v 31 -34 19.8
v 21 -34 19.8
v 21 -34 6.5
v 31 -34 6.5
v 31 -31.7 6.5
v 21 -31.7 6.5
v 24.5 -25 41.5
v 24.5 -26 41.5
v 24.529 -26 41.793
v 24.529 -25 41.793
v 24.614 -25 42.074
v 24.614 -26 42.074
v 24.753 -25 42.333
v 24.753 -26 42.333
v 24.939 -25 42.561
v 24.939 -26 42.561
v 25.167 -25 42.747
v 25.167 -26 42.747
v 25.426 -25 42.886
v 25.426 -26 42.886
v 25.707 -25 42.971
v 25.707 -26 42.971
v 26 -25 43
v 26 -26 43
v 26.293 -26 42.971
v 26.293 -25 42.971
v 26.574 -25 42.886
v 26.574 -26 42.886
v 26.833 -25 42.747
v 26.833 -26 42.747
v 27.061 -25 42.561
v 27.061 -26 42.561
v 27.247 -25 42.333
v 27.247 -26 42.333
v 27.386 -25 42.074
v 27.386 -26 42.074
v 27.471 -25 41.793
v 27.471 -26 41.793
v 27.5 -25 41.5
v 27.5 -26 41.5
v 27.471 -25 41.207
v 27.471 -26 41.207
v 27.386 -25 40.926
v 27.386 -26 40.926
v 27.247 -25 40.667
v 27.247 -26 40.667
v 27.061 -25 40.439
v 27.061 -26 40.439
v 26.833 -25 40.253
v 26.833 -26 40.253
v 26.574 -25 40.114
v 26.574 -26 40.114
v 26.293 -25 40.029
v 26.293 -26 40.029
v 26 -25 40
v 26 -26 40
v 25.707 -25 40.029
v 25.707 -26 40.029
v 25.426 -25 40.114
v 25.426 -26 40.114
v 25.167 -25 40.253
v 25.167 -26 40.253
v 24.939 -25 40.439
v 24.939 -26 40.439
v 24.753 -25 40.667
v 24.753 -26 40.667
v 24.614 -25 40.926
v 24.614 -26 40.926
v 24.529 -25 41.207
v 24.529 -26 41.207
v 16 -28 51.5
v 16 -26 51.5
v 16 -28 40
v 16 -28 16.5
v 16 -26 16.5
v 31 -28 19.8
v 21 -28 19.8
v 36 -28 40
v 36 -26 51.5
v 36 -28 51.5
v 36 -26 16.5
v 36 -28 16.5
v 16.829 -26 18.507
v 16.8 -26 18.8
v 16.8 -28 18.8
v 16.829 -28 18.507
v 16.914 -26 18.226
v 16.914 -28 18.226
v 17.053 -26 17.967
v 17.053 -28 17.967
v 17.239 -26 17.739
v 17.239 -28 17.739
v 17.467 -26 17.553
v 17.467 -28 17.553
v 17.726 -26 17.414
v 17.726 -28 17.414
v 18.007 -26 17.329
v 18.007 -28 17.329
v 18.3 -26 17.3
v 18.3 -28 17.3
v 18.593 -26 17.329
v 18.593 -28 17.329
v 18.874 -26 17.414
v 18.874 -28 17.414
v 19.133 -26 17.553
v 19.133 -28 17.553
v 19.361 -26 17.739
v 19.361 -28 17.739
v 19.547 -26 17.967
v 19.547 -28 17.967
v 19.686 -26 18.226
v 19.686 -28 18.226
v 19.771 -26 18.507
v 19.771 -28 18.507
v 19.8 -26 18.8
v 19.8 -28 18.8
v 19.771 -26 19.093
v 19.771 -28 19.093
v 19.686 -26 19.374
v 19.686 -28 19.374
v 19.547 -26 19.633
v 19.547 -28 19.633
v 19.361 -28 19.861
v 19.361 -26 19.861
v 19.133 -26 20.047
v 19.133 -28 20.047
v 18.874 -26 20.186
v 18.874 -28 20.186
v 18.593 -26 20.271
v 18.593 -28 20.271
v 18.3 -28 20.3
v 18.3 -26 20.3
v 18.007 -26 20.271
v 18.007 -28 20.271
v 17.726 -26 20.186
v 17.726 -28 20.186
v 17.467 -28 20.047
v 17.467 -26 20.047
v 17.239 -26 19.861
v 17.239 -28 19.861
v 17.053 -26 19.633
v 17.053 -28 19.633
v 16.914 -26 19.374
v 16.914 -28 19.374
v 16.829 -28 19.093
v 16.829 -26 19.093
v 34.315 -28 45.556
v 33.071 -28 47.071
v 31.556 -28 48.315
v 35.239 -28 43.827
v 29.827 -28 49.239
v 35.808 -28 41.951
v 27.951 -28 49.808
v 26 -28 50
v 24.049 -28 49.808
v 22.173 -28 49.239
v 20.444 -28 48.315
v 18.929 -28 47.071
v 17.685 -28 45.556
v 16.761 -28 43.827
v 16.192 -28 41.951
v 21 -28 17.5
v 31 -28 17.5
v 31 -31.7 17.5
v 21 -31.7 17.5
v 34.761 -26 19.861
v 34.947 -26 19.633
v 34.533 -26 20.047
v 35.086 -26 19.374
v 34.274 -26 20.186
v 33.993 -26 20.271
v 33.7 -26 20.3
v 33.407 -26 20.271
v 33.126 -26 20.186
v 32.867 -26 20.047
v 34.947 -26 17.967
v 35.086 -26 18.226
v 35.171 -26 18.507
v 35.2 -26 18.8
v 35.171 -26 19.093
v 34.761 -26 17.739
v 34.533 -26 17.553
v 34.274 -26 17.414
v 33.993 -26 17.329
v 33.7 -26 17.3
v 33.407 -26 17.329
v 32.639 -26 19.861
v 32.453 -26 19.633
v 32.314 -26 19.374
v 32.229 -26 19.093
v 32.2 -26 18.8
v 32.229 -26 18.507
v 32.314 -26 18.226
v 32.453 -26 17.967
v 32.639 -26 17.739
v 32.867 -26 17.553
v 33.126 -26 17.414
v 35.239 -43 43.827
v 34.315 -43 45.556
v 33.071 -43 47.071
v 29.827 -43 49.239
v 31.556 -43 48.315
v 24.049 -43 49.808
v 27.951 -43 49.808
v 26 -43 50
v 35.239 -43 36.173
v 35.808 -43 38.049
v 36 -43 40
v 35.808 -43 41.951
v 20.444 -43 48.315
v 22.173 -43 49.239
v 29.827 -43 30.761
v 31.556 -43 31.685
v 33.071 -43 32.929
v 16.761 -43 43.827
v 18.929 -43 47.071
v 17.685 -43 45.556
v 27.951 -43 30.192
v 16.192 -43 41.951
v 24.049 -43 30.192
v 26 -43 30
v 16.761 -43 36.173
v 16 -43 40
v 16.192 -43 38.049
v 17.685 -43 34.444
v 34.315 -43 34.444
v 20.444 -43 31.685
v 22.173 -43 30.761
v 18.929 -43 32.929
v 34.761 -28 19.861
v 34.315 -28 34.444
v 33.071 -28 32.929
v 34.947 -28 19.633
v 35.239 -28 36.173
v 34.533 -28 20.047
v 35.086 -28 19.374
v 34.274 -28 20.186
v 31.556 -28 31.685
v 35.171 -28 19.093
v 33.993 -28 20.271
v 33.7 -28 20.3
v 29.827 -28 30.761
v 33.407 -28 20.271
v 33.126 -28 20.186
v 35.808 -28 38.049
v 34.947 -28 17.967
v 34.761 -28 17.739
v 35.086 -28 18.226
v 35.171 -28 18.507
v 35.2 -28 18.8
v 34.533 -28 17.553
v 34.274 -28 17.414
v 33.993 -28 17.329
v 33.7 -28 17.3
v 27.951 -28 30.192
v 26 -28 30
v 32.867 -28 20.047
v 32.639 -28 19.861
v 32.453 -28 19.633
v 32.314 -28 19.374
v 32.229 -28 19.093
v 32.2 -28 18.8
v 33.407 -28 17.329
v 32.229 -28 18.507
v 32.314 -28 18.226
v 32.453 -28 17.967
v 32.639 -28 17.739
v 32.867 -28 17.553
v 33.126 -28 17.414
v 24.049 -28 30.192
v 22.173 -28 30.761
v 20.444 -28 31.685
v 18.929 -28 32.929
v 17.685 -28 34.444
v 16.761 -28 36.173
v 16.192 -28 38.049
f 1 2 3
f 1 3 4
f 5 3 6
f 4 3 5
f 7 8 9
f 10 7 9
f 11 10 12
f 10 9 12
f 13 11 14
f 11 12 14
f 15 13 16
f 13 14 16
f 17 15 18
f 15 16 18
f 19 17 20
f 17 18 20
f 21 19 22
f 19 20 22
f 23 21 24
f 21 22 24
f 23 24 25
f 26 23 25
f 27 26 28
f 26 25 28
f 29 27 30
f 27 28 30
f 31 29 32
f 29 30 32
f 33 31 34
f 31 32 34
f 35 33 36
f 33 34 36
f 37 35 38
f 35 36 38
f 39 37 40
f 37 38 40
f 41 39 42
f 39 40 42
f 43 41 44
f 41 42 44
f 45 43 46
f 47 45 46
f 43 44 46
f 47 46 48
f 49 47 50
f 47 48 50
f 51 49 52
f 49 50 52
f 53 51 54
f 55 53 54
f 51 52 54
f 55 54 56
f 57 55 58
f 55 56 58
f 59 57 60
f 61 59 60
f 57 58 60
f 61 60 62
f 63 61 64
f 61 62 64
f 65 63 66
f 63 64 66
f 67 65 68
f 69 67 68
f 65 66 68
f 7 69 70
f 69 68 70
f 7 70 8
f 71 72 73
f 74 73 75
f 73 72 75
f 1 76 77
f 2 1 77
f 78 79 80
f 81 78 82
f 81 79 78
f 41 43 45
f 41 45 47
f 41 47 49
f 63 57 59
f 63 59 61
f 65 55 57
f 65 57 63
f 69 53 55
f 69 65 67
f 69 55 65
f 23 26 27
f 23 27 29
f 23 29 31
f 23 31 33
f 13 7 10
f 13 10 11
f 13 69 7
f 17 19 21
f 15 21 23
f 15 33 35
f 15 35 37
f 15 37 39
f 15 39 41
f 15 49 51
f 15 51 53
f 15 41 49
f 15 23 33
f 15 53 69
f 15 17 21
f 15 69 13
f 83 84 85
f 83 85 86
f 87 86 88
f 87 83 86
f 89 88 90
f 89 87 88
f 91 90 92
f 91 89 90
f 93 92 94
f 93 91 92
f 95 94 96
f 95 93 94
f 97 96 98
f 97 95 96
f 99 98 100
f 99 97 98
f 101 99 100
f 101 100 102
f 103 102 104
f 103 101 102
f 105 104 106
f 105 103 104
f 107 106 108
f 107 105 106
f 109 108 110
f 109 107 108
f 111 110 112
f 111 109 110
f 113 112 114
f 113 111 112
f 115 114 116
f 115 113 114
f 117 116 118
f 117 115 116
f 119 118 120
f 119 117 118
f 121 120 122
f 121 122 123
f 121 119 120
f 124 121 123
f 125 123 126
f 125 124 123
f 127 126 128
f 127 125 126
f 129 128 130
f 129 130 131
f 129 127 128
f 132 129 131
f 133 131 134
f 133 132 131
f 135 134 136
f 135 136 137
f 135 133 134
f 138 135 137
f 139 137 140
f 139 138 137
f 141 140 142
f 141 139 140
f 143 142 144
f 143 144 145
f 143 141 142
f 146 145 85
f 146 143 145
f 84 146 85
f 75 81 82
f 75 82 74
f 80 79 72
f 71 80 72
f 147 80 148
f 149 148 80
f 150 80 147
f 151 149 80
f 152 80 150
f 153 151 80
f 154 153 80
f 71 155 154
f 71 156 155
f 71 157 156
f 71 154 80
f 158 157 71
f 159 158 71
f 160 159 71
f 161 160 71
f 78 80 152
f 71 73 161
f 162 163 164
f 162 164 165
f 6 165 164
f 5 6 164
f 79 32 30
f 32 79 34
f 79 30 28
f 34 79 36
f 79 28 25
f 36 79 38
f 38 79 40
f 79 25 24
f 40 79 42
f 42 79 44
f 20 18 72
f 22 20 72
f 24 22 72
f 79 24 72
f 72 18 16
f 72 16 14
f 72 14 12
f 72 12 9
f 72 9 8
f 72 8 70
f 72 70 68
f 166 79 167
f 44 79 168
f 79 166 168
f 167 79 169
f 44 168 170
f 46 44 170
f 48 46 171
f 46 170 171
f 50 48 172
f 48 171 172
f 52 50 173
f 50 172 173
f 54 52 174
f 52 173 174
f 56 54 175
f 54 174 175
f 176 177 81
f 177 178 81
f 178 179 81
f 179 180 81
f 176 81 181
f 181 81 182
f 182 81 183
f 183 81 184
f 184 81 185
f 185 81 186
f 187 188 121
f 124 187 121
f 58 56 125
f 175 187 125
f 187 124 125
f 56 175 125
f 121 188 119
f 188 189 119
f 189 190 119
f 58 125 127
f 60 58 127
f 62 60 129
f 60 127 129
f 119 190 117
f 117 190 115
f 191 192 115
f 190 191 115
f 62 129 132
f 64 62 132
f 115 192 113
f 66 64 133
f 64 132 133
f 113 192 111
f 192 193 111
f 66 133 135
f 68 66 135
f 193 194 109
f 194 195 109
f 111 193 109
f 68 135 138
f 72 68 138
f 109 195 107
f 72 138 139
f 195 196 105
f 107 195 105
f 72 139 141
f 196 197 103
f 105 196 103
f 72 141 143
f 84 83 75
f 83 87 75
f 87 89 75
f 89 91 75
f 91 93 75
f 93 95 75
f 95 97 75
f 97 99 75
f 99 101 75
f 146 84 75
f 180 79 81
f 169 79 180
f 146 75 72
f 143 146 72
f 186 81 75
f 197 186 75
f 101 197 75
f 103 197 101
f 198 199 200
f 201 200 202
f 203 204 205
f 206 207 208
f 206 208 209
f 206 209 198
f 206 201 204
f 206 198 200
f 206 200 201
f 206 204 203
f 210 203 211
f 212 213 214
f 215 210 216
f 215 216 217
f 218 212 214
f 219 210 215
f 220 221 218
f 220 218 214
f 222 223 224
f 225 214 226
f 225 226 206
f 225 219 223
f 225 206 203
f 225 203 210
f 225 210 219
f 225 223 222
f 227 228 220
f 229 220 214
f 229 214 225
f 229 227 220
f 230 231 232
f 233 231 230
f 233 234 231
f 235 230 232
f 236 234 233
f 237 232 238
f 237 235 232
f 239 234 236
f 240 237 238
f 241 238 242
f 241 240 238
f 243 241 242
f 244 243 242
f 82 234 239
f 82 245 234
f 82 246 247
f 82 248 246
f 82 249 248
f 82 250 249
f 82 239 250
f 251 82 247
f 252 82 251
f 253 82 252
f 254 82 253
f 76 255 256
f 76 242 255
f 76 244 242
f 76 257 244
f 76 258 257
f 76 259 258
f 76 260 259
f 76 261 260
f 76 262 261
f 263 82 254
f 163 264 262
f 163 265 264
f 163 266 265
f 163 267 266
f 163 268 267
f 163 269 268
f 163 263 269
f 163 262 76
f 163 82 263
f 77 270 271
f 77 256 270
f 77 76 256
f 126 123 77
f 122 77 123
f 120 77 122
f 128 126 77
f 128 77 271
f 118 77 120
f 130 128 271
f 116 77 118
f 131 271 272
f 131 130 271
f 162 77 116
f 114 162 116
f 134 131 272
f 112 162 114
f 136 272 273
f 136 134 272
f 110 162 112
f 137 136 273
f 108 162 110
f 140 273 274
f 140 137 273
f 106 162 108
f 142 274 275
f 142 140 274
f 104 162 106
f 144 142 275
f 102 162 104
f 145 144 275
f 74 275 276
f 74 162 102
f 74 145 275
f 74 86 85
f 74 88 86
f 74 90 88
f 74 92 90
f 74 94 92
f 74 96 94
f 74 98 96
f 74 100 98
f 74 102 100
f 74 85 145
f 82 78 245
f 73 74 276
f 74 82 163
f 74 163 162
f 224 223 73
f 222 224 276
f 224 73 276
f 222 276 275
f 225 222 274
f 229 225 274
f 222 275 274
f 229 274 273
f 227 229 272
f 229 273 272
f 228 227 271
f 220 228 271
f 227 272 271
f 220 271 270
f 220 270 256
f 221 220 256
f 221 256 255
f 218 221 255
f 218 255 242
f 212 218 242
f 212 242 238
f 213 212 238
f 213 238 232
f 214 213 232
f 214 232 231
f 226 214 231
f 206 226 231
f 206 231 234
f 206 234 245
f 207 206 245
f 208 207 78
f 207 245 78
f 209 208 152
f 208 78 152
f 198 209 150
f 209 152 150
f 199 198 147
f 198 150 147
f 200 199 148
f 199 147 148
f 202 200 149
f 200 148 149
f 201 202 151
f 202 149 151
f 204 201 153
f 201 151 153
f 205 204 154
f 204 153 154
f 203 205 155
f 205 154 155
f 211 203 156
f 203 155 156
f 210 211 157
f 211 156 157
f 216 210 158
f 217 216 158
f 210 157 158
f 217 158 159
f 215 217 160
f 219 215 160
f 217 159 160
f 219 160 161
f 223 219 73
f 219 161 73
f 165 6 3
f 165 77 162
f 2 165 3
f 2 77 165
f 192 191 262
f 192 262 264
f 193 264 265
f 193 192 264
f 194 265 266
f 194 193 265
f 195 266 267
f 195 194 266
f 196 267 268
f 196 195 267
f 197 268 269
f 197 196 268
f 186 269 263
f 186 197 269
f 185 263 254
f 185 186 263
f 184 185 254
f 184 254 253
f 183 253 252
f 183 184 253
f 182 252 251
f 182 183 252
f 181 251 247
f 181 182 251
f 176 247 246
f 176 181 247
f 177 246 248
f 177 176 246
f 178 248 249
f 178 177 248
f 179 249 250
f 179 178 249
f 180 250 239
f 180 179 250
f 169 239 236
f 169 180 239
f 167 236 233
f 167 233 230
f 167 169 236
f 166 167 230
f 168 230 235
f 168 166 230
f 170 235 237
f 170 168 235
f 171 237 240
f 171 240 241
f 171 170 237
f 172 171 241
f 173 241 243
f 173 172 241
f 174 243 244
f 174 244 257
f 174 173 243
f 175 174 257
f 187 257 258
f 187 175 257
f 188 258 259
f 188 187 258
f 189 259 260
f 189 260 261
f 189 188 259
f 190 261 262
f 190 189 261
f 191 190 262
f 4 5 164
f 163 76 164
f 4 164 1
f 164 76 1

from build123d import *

# Parameters (mm, degrees)
SKETCH009_W             = 20
SKETCH009_H             = 35
SKETCH009_R             = 1.5
PAD007_DEPTH            = 2
SKETCH010_R             = 10
PAD008_DEPTH            = 15
SKETCH011_R             = 1.5
PAD009_DEPTH            = 1
SKETCH012_W             = 10
SKETCH012_H             = 2.3
PAD010_DEPTH            = 6
SKETCH013_W             = 10
SKETCH013_H             = 2.3
PAD011_DEPTH            = 11
BODY002_PLACEMENT_ANGLE = 180


with BuildPart() as part:
    # Sketch009 → Pad007 (new body)
    with BuildSketch(Plane.XZ):
        Rectangle(SKETCH009_W, SKETCH009_H)
        with Locations((7.7, 15.2)):
            Circle(SKETCH009_R, mode=Mode.SUBTRACT)
        with Locations((-7.7, 15.2)):
            Circle(SKETCH009_R, mode=Mode.SUBTRACT)
    extrude(amount=PAD007_DEPTH)

    # Sketch010 (on Face8 of Pad007) → Pad008 (join)
    with BuildSketch(Plane.XZ.offset(2)):
        with Locations((0, -6)):
            Circle(SKETCH010_R)
    extrude(amount=PAD008_DEPTH)

    # Sketch011 (on Face4 of Pad008) → Pad009 (join)
    with BuildSketch(Plane(origin=(0, 0, 0), x_dir=(1, 0, 0), z_dir=(0, 1, 0))):
        with Locations((0, 7.5)):
            Circle(SKETCH011_R)
    extrude(amount=PAD009_DEPTH)

    # Sketch012 (on Face5 of Pad009) → Pad010 (join)
    with BuildSketch(Plane.XZ.offset(2)):
        with Locations((0, 15.35)):
            Rectangle(SKETCH012_W, SKETCH012_H)
    extrude(amount=PAD010_DEPTH)

    # Sketch013 (on Face13 of Pad010) → Pad011 (join)
    with BuildSketch(Plane(origin=(0, 0, 16.5), x_dir=(-1, 0, 0), z_dir=(0, 0, 1))):
        with Locations((0, 6.85)):
            Rectangle(SKETCH013_W, SKETCH013_H)
    extrude(amount=PAD011_DEPTH)


with BuildPart() as part_1:
    # Body002 placement: moved
    add(part.part.moved(Location((26, -26, 34))).rotate(Axis((26, -26, 34), (0, 1, 0)), BODY002_PLACEMENT_ANGLE))


solid = part_1.part
